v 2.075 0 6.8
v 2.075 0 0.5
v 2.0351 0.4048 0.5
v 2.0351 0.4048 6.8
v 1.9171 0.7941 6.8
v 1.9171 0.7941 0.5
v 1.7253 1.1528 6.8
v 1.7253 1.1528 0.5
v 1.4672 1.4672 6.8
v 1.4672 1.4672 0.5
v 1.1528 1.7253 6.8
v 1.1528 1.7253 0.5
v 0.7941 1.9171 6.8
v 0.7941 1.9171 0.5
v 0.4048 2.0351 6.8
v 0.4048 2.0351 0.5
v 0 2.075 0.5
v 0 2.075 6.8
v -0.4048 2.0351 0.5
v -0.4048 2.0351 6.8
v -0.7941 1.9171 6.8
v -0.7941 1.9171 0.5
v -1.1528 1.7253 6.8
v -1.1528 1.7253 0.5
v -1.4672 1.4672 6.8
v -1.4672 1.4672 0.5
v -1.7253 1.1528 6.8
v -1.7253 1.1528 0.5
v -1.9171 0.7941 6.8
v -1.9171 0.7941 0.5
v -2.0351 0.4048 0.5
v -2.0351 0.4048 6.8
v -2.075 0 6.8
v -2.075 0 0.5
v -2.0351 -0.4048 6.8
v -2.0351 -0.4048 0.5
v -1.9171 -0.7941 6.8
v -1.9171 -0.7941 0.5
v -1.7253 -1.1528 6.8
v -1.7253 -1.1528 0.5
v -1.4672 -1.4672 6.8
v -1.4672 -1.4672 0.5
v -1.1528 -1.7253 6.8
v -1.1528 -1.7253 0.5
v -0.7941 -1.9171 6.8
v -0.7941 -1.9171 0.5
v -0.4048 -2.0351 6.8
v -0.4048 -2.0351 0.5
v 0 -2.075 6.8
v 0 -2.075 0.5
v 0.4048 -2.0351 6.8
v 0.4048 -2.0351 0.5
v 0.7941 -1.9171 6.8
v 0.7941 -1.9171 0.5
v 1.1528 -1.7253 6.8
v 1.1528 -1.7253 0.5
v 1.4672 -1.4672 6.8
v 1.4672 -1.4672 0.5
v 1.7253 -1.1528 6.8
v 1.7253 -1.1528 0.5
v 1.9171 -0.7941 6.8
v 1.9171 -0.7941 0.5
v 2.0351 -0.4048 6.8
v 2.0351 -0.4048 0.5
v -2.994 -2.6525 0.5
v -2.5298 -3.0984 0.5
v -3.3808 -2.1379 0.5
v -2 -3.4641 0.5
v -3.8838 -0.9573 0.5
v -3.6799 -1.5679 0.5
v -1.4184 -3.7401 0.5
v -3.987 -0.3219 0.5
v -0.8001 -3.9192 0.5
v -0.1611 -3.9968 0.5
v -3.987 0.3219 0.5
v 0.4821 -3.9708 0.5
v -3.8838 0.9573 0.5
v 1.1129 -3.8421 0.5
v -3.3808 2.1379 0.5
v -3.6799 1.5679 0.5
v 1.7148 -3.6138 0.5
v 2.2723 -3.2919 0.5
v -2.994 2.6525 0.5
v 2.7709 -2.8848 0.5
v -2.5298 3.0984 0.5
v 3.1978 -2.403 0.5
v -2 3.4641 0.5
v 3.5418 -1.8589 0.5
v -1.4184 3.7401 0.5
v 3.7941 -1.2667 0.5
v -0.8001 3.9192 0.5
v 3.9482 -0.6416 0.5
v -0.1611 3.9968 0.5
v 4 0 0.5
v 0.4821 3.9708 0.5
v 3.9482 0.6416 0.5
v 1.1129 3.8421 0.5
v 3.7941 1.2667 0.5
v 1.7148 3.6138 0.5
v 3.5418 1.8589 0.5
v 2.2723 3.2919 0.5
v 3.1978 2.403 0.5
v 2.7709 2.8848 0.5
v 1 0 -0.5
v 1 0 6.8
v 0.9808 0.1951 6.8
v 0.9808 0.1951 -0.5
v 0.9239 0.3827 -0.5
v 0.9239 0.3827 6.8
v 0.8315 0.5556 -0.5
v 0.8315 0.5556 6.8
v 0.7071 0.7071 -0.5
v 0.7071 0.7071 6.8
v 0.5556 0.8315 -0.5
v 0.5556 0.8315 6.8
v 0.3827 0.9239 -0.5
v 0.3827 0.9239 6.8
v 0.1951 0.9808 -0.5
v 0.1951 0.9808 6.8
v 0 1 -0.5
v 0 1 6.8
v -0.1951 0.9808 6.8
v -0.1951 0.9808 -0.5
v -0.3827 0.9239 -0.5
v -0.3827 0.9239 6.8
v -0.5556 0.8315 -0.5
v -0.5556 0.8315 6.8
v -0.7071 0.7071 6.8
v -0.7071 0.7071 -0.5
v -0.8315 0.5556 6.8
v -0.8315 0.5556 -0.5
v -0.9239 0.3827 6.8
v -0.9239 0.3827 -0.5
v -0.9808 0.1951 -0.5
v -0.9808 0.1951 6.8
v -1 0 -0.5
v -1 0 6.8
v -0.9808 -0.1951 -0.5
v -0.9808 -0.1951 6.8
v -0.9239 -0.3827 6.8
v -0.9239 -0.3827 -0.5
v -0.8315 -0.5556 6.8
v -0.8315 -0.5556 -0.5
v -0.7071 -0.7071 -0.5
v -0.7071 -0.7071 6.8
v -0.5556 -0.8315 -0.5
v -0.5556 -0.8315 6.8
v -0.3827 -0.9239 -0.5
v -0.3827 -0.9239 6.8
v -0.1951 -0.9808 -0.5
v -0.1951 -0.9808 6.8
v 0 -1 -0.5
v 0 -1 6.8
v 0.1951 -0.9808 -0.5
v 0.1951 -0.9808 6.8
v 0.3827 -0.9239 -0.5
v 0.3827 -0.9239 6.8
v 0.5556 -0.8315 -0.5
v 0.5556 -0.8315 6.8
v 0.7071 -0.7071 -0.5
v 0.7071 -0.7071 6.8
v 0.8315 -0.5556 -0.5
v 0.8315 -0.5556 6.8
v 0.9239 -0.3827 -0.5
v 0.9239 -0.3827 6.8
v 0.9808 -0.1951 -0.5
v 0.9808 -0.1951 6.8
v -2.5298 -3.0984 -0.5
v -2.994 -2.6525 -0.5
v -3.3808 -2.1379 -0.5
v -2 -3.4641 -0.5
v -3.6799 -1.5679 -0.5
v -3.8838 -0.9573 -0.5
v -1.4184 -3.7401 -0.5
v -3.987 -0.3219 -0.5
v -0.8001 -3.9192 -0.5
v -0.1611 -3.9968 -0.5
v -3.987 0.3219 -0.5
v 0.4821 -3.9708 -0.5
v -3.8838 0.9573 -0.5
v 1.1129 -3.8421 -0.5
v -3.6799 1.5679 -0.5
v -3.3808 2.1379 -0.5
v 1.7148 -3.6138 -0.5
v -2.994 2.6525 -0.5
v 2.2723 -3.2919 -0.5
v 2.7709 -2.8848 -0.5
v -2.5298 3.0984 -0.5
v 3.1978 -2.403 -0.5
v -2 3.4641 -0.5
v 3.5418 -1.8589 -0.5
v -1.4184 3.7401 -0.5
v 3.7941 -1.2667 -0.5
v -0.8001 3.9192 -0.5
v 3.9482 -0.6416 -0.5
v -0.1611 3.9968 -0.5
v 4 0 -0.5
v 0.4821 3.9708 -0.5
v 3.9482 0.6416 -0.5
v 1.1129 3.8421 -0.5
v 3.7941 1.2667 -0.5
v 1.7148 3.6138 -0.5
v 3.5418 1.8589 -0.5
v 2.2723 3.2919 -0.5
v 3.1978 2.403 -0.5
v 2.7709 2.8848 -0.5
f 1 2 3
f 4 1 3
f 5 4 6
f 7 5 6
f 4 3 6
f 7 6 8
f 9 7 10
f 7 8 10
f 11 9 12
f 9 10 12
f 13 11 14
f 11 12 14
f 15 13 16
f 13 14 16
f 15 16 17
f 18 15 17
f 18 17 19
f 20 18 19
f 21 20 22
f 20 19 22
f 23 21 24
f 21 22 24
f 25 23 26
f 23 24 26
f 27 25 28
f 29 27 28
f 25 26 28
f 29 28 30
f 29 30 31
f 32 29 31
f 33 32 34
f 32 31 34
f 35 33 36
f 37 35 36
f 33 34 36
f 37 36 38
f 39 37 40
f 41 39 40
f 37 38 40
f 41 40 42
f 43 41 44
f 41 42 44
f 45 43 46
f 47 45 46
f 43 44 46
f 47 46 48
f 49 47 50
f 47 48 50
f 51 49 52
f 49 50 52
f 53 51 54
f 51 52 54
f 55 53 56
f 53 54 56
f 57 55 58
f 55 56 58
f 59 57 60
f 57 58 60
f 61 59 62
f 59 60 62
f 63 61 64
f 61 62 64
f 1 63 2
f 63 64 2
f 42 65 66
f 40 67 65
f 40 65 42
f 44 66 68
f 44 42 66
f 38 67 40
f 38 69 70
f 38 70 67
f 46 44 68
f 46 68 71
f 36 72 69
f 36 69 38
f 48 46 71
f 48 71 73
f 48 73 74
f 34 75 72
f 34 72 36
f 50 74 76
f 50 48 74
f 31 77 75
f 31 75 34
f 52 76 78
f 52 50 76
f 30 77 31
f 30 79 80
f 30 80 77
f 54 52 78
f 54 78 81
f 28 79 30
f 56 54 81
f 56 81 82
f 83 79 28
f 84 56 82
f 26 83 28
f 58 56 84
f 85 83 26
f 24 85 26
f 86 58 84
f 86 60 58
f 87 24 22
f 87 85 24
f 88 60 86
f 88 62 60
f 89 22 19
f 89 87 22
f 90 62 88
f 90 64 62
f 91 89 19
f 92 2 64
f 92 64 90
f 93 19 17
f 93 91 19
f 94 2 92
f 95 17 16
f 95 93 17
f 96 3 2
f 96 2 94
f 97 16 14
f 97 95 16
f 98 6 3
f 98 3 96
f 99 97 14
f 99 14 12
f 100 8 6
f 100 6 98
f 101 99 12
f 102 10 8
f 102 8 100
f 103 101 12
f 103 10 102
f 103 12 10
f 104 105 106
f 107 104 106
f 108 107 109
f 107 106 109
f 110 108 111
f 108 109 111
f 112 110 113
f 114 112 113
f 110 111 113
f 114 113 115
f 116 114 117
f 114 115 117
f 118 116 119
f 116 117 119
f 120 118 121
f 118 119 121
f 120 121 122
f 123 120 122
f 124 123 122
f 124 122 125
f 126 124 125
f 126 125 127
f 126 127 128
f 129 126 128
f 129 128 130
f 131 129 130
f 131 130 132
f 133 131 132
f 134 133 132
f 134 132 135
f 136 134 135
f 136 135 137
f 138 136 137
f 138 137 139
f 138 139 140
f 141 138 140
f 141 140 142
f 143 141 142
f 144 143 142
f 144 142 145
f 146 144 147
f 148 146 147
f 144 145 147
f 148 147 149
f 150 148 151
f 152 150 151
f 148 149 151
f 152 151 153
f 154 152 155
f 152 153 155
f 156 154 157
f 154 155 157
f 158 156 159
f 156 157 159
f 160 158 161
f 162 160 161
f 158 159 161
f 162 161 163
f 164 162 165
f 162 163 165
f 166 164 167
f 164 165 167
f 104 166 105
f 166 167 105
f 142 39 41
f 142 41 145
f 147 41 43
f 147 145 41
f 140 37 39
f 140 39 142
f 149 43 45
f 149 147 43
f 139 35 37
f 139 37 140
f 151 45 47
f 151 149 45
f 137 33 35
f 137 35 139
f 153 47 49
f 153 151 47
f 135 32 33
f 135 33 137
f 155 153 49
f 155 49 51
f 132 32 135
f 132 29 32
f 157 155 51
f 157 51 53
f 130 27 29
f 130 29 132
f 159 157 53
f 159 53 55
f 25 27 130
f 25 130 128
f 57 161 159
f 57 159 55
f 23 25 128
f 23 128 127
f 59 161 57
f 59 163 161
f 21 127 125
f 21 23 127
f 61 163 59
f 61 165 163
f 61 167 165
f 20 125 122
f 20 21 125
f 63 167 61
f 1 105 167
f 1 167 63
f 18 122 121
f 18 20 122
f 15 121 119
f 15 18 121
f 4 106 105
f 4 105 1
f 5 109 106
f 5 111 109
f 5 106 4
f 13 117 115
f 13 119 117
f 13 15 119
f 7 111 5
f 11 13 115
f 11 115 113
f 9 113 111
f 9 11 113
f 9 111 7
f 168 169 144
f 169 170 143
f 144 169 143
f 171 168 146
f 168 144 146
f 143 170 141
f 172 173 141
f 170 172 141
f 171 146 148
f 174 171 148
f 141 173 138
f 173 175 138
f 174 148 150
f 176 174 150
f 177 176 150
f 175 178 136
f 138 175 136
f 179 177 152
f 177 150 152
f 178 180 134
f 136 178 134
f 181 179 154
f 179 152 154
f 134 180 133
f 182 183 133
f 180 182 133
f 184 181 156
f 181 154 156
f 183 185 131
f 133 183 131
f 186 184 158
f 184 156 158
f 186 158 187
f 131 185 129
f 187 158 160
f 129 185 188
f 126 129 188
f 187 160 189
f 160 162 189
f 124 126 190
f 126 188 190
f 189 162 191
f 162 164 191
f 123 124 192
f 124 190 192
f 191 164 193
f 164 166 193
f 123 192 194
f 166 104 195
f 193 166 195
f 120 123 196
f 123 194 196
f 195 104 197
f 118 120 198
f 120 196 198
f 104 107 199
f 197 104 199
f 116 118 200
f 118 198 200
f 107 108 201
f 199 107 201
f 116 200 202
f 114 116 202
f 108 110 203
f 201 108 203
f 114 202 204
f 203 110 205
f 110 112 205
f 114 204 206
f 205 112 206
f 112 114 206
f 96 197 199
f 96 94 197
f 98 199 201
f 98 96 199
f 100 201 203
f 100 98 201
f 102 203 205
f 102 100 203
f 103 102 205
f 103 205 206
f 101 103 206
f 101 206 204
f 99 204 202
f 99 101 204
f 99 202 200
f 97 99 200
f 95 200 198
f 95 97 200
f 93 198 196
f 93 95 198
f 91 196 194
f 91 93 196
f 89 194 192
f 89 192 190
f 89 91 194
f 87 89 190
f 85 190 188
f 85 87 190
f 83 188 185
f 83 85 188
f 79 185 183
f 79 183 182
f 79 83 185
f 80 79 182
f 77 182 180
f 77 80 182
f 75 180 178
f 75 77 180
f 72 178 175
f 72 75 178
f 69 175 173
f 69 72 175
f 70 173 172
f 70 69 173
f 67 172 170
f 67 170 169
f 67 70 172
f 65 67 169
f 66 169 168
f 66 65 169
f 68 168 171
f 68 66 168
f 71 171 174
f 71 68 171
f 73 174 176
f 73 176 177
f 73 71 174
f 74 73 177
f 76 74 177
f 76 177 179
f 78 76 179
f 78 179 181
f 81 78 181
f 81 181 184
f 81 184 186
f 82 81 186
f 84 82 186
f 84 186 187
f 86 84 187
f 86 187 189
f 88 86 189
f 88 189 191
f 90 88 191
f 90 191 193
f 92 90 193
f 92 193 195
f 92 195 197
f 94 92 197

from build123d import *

# Parameters (mm, degrees)
FLANGE_SKETCH_R      = 4
FLANGE_EXTRUDE_DEPTH = 0.5
JOINT_SKETCH_R       = 2.075
JOINT_EXTRUDE_DEPTH  = 6.3
HOLE_SKETCH_R        = 1
HOLE_EXTRUDE_DEPTH   = 10.235258524


with BuildPart() as part:
    # Flange Sketch → Flange Extrude (new, symmetric)
    with BuildSketch(Plane.XY):
        Circle(FLANGE_SKETCH_R)
    extrude(amount=FLANGE_EXTRUDE_DEPTH, both=True)

    # Joint Sketch → Joint Extrude (add)
    with BuildSketch(Plane.XY.offset(0.5)):
        Circle(JOINT_SKETCH_R)
    extrude(amount=JOINT_EXTRUDE_DEPTH)

    # Hole Sketch → Hole Extrude (cut, through all)
    with BuildSketch(Plane.XY.offset(6.8)):
        Circle(HOLE_SKETCH_R)
    extrude(amount=-HOLE_EXTRUDE_DEPTH, mode=Mode.SUBTRACT)


solid = part.part
